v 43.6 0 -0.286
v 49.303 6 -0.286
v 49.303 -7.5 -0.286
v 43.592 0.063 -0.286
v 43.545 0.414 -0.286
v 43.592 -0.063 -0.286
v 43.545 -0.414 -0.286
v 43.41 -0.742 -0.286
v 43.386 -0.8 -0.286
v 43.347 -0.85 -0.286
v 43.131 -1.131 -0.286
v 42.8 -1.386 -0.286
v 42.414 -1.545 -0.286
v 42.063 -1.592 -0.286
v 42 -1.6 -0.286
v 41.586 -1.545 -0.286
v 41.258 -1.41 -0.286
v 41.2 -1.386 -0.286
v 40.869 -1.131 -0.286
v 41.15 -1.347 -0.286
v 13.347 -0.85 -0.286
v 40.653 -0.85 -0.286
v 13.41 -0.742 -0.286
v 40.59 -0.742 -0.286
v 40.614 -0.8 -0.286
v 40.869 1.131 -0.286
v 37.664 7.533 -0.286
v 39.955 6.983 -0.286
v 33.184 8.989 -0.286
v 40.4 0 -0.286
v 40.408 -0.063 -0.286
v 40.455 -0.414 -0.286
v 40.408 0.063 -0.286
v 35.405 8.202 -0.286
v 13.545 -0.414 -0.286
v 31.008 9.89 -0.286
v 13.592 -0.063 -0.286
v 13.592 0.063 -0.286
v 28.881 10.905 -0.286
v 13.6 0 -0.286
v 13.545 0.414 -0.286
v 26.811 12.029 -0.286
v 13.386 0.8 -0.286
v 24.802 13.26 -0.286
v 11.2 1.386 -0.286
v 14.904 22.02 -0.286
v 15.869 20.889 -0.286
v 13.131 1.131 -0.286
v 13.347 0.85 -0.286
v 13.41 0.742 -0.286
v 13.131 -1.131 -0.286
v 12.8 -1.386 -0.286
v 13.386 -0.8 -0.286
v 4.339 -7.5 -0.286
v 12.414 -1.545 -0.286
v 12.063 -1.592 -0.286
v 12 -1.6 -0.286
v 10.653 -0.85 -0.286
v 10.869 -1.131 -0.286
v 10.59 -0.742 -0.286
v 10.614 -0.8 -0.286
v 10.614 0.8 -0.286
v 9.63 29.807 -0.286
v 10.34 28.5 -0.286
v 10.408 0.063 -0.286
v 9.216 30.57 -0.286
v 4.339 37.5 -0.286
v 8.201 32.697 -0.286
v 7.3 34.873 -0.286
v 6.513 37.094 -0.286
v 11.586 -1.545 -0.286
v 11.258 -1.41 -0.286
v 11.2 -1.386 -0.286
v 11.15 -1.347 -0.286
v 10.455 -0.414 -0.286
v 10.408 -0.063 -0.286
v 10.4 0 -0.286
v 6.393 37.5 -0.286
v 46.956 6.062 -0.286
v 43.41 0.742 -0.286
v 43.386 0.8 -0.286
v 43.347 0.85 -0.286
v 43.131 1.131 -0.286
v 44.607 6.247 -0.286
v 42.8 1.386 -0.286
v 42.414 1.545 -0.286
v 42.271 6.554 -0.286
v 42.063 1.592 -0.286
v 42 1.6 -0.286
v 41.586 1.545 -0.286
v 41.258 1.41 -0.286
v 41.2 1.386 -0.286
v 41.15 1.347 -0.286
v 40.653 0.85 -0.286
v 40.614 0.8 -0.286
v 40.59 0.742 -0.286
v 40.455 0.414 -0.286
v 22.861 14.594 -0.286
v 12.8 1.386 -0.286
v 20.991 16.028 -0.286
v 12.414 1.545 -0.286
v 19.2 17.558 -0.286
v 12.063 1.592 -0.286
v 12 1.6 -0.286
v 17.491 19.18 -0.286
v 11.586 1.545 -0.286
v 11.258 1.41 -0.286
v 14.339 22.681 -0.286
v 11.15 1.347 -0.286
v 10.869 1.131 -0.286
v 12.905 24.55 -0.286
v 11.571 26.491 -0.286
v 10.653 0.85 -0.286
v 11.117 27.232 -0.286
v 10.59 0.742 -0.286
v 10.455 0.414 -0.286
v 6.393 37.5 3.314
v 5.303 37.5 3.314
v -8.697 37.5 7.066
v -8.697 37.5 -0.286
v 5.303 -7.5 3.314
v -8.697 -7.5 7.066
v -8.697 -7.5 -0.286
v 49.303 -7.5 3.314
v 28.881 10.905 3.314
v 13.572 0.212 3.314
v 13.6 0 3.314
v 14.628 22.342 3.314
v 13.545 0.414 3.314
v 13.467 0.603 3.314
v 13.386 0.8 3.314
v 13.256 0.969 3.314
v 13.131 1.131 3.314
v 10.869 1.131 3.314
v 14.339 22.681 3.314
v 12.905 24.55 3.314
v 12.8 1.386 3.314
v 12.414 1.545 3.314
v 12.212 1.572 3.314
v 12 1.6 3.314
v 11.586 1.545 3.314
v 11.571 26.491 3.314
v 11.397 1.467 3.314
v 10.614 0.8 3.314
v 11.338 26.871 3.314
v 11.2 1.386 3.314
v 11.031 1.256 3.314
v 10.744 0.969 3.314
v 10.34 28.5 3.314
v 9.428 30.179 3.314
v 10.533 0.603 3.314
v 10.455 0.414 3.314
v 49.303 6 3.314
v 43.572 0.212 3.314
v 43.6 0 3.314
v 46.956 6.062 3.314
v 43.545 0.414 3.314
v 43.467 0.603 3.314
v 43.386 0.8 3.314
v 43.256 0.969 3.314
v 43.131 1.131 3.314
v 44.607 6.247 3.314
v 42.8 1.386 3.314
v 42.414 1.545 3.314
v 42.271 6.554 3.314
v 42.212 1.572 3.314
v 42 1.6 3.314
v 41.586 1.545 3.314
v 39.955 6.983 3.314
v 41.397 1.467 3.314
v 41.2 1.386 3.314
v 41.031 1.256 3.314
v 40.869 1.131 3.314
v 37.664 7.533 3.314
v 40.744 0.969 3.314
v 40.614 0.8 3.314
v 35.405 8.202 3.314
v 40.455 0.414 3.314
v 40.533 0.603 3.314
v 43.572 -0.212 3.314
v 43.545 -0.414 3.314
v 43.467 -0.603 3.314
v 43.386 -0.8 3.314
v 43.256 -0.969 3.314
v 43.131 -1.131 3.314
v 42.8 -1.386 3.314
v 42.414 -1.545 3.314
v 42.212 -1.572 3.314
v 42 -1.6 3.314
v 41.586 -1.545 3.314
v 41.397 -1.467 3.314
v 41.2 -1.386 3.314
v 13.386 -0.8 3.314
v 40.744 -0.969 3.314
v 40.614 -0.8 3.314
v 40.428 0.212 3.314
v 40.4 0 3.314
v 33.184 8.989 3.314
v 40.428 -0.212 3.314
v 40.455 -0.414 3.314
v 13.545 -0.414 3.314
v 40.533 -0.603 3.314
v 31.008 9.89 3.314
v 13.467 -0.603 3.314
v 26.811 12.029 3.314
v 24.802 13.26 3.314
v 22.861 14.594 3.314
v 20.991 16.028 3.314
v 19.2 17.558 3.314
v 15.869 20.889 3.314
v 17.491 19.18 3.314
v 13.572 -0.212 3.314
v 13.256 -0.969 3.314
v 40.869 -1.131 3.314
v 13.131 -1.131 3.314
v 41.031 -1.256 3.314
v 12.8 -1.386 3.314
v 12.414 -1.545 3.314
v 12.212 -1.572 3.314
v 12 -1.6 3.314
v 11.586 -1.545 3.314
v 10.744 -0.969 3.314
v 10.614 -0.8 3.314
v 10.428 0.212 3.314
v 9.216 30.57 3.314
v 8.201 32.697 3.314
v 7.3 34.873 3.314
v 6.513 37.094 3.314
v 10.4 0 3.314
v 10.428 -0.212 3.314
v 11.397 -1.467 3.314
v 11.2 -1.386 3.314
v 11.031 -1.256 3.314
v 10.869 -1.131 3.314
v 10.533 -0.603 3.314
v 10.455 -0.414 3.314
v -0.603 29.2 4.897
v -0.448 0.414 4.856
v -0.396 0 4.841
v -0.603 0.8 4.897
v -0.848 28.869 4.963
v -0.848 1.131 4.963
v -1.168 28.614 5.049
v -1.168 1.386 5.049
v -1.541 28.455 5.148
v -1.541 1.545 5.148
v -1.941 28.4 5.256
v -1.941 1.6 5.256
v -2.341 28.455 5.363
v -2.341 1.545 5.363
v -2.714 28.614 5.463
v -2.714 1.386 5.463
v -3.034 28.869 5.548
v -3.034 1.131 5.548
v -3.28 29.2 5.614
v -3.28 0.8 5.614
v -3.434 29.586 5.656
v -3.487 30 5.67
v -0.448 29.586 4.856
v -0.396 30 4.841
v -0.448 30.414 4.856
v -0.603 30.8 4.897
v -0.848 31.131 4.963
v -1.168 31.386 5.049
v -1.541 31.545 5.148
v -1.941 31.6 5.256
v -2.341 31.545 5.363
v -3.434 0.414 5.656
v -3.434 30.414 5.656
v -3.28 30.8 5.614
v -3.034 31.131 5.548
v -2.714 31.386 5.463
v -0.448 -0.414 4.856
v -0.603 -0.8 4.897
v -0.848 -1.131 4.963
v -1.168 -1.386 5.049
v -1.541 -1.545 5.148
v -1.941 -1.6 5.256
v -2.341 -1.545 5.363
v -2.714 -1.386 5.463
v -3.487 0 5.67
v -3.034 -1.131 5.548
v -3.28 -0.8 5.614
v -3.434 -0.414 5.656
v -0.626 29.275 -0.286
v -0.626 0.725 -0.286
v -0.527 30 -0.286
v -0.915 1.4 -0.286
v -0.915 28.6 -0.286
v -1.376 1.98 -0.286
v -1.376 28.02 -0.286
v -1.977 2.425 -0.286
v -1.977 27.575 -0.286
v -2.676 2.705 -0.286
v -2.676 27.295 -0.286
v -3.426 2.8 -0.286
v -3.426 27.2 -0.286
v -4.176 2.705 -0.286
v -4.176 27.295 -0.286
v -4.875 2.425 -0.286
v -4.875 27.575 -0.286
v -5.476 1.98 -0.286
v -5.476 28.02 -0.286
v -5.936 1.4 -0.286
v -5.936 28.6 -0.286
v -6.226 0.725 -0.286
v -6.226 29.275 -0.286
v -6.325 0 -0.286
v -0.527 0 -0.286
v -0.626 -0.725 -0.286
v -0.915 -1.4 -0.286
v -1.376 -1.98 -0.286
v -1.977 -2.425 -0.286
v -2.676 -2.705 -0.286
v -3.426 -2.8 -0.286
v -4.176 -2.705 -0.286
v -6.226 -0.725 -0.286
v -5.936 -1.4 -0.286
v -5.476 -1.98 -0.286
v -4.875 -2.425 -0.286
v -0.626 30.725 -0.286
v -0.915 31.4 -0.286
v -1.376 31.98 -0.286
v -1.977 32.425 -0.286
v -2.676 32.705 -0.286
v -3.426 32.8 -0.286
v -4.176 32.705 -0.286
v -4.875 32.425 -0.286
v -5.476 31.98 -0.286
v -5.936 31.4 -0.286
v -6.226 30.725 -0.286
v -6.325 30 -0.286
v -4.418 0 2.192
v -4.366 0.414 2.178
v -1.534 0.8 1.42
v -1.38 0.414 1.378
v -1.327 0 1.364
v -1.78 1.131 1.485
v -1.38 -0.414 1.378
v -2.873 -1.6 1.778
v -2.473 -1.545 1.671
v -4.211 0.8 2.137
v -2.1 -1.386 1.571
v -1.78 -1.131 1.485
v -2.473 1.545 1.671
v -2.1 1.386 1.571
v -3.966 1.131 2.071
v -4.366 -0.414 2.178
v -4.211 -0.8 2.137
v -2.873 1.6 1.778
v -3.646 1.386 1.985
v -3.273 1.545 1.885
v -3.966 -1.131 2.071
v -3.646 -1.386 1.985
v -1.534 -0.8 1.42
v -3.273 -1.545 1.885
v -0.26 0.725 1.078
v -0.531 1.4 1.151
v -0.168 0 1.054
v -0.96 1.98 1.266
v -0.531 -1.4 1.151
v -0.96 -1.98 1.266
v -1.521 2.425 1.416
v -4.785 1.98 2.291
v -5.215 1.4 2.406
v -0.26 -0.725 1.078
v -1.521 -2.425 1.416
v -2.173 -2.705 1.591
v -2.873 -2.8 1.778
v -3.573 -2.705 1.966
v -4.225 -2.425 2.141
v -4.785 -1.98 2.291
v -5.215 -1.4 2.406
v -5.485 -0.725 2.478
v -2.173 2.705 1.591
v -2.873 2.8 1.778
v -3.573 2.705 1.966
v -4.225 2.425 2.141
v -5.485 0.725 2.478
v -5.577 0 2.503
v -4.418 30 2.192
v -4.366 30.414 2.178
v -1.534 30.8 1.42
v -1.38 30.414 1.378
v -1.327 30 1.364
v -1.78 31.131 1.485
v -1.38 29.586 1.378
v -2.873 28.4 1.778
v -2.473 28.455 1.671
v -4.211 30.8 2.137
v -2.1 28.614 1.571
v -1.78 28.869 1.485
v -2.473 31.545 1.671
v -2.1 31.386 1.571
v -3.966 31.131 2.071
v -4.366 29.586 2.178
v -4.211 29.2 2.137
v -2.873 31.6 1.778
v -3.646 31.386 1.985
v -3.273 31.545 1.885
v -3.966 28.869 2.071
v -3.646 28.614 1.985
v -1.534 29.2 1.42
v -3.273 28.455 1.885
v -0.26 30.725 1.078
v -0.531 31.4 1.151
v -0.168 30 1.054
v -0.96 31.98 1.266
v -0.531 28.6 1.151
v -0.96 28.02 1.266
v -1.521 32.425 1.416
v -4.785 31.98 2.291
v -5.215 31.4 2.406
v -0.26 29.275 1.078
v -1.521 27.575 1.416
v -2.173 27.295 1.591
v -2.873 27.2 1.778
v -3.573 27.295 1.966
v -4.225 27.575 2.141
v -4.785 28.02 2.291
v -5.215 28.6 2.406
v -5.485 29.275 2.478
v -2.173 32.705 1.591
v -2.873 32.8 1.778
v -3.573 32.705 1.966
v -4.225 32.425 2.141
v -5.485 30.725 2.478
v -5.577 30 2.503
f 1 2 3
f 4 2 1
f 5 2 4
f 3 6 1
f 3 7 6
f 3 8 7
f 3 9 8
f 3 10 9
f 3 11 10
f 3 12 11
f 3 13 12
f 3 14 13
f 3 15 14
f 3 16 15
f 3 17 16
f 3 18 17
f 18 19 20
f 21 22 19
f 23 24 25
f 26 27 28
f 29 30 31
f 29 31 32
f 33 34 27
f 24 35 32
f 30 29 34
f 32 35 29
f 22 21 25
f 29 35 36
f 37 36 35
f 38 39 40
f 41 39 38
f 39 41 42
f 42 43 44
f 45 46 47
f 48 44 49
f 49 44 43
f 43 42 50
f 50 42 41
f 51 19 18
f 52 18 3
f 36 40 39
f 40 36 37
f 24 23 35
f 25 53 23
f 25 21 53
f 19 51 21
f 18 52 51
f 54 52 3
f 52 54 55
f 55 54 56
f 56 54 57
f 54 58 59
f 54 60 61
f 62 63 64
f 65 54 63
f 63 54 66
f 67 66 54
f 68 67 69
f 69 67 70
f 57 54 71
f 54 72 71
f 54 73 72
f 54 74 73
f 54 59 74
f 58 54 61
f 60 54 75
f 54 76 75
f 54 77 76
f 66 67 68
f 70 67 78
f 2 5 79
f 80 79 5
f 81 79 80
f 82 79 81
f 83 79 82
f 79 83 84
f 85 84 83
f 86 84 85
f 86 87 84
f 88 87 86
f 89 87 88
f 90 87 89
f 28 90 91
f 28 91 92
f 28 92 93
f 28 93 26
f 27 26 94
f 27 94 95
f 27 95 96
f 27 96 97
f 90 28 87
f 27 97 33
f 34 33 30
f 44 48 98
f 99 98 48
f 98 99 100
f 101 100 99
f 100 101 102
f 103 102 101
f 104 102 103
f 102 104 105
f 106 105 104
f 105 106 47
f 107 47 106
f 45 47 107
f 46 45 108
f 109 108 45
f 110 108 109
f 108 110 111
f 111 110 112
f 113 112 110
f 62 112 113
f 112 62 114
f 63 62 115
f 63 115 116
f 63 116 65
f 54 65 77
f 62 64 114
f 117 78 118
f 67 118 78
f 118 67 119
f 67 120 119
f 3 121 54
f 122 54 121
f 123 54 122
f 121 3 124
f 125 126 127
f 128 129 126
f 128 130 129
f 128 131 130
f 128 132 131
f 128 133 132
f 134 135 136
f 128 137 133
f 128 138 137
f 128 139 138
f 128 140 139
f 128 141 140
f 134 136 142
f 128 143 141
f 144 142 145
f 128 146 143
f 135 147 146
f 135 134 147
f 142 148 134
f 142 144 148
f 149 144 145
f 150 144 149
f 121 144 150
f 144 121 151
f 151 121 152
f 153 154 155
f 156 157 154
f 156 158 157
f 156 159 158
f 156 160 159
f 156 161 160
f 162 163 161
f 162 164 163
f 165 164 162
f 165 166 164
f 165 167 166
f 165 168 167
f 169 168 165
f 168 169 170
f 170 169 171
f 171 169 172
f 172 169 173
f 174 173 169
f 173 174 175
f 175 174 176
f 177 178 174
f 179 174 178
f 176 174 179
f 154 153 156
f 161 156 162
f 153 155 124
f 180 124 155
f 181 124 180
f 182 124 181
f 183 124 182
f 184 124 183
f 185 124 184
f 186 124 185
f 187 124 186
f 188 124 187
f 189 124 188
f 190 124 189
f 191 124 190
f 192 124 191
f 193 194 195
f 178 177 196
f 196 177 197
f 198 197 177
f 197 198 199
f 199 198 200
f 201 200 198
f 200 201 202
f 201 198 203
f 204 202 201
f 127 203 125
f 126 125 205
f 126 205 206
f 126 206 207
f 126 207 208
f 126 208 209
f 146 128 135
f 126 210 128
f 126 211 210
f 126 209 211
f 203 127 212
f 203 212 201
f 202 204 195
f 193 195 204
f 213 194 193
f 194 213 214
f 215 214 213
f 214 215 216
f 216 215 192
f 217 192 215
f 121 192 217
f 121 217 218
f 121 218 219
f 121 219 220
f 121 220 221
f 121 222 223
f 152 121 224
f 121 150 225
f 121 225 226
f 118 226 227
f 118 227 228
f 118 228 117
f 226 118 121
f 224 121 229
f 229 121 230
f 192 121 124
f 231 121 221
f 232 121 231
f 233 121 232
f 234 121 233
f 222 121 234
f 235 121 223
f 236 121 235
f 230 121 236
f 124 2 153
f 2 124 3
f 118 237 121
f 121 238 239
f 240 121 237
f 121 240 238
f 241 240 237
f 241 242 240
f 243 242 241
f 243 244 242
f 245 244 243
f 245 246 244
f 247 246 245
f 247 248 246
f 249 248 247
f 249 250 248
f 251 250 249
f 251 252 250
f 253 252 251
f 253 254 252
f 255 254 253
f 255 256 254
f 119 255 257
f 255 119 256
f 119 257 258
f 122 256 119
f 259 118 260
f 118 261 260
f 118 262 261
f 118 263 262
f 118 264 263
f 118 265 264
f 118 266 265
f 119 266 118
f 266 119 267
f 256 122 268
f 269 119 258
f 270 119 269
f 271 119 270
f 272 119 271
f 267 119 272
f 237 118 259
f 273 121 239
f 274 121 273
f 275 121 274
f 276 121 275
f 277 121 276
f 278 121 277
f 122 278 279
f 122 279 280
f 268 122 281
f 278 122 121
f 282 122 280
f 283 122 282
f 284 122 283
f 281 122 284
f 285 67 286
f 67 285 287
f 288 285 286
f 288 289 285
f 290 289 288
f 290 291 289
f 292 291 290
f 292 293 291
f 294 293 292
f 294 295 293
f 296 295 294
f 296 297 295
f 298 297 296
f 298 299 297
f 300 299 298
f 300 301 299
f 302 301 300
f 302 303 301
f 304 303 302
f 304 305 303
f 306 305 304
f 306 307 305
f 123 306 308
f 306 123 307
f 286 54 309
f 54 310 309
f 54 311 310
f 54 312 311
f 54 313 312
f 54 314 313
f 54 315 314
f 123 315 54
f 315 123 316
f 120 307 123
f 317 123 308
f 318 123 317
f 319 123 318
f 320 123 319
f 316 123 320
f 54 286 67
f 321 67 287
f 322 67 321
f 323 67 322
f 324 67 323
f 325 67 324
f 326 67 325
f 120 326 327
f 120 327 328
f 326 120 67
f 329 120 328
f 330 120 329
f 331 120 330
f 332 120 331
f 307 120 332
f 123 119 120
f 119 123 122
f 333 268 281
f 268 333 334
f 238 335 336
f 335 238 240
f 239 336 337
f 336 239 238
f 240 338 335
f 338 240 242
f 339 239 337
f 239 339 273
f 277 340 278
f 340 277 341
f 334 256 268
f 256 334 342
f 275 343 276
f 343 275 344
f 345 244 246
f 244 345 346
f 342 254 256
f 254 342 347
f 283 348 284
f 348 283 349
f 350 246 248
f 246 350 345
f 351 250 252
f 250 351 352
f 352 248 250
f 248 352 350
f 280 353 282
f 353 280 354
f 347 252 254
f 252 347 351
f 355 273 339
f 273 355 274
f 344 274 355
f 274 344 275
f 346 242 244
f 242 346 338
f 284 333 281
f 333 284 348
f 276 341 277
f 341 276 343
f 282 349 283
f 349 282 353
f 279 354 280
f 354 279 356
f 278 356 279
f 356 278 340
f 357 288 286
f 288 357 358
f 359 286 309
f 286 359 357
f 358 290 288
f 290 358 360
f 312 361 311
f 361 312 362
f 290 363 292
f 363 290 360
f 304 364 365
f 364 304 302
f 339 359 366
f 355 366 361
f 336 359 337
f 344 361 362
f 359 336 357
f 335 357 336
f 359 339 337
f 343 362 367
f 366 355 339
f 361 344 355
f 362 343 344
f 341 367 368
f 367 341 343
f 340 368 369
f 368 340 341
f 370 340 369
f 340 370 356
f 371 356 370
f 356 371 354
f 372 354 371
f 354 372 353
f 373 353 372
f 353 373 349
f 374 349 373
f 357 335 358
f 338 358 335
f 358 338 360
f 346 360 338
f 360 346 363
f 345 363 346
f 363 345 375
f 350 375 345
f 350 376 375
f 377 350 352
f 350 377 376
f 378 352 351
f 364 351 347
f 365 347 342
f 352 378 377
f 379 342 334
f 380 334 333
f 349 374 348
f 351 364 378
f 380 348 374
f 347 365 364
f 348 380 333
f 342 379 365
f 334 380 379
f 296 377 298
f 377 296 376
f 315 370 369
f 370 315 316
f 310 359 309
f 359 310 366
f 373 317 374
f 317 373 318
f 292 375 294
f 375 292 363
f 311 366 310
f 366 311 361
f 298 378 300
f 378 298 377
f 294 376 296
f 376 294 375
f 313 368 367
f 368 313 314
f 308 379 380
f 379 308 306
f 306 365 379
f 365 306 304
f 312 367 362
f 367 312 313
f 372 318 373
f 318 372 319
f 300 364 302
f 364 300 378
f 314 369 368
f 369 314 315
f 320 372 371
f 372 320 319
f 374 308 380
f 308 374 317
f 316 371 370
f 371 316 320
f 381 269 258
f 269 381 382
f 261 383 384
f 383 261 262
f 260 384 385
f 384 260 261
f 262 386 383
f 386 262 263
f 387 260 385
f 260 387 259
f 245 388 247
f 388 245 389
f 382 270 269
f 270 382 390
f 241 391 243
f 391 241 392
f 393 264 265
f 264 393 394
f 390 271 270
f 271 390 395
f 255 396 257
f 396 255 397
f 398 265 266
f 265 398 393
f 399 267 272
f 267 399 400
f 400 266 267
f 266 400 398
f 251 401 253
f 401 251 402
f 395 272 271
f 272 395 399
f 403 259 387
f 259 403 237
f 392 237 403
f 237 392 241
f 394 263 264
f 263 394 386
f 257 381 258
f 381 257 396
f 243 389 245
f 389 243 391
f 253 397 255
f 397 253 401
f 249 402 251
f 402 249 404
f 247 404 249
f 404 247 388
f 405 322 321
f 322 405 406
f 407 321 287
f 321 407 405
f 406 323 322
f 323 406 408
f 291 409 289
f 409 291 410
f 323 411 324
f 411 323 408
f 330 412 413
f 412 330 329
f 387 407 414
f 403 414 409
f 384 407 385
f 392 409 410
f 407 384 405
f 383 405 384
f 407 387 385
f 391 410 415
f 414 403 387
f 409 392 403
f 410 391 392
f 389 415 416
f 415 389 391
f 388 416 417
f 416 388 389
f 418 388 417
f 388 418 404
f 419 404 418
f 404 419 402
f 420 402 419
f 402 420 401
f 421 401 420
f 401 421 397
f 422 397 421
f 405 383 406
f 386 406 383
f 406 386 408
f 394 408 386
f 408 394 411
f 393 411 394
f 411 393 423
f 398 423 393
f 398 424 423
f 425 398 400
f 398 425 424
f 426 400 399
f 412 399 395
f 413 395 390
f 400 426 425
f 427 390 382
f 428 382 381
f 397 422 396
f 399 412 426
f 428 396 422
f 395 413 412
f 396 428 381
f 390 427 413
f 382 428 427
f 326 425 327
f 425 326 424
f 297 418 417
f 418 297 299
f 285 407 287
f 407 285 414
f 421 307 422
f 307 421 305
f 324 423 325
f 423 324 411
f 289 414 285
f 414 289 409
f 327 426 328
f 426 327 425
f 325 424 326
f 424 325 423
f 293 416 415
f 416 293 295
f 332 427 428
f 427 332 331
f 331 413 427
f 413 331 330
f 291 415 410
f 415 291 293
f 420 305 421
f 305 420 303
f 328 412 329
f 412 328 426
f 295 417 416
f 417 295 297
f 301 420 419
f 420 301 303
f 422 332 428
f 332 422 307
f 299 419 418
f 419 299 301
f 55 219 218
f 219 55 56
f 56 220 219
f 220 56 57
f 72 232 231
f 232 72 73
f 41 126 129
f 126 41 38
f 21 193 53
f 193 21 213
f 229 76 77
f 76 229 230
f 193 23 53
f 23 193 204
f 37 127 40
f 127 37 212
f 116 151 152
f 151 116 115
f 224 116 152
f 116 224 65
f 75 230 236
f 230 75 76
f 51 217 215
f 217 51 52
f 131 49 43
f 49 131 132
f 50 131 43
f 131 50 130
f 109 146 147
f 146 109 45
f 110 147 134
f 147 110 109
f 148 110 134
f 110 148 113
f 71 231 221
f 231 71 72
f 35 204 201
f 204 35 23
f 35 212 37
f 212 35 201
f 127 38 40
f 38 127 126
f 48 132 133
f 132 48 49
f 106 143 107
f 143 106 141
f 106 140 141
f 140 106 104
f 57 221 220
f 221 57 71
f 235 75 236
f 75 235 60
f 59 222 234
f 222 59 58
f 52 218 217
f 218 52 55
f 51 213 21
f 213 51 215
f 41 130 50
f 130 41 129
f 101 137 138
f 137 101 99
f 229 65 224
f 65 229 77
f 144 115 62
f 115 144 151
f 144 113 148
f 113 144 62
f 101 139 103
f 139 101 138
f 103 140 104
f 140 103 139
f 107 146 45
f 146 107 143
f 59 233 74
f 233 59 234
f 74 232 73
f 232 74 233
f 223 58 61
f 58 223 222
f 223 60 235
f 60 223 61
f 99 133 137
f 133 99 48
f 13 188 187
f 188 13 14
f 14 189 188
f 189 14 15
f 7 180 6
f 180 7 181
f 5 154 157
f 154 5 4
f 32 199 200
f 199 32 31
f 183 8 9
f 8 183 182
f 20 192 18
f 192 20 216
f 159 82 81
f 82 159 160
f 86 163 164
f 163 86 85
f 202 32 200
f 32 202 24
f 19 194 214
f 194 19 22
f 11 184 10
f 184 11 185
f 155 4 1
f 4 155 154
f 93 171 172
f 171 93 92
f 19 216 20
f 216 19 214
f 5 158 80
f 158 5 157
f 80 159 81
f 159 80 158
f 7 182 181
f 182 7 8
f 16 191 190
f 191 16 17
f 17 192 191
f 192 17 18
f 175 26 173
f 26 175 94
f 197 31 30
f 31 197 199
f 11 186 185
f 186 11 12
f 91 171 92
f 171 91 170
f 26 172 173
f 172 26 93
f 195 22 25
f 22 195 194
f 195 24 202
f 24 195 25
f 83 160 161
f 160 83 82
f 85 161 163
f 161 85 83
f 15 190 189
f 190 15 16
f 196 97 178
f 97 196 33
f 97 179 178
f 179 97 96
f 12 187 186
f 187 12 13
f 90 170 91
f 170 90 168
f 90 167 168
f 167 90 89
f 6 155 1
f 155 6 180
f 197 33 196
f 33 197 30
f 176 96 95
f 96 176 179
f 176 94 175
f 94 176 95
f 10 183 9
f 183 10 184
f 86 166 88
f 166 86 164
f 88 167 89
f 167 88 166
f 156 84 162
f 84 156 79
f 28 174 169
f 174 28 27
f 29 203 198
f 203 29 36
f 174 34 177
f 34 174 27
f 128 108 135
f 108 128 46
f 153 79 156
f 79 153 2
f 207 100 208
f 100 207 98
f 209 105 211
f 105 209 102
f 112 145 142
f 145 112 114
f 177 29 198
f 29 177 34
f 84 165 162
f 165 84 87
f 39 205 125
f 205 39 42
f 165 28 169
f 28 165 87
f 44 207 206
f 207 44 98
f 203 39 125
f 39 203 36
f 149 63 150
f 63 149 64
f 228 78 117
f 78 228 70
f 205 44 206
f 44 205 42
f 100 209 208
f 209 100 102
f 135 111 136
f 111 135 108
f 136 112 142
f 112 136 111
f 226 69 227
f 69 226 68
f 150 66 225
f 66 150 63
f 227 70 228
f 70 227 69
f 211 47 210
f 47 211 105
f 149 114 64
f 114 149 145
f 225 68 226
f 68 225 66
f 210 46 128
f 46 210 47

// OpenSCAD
// file: configuration.scad
// Increase this if your slicer or printer make holes too tight.
extra_radius = 0.2;

// OD = outside diameter, corner to corner.
m3_nut_od = 6.1;
m3_nut_radius = m3_nut_od/2 + 0.2 + extra_radius;

// Major diameter of metric 3mm thread.
m3_major = 2.85;
m3_radius = m3_major/2 + extra_radius;
m3_wide_radius = m3_major/2 + 0.2 + extra_radius;

// NEMA17 stepper motors.
motor_shaft_diameter = 5;
motor_shaft_radius = motor_shaft_diameter/2 + extra_radius;

// Frame brackets.
thickness = 3.6;
// main file
include <configuration.scad>;

height = 45;
diagonal = 15*sqrt(2);

module frame_cheek() {
  difference() {
    intersection() {
      translate([diagonal/2, 0, 0]) rotate([0, 0, -30])
	translate([thickness-11, 15, height/2-7.5])
	cube([22, 58, height], center=true);
      union() {
	translate([diagonal/2, 0, 0]) rotate([0, 0, -30])
	  translate([thickness/2, 20, height/2-7.5])
	  cube([thickness, 48, height], center=true);
	rotate([0, 0, -45])
	  translate([15, 0, height/2-7.5])
	  cube([15, 15, height], center=true);
      }
    }
    // Vertical OpenBeam mounting screw holes.
    for (z = [0, 1]) {
      translate([0, 0, z*(height-15)]) rotate([90, 0, 45])
	translate([0, 0, 7.5+thickness]) {
	cylinder(r=1.6, h=20, $fn=24, center=true);
	cylinder(r=2.8, h=10, $fn=24);
      }
    }
    // Horizontal OpenBeam mounting screw holes.
    for (y = [12, 42]) {
      rotate([0, 0, -30])
	translate([7.5+thickness/2, y, 0])
	rotate([0, 90, 0])
	cylinder(r=1.6, h=10, $fn=24, center=true);
    }
    translate([38, 35, 51]) rotate([0, 90, -30]) #
      cylinder(r=45, h=20, center=true, $fn=120);
  }
}

translate([0, 0, 12.5])
scale([-1, 1, 1])
rotate([0, 90, 90])
rotate([0, 0, 30]) {
  frame_cheek();
  // OpenBeam.
  % rotate([0, 0, 45]) cube([15, 15, 100], center=true);
}
